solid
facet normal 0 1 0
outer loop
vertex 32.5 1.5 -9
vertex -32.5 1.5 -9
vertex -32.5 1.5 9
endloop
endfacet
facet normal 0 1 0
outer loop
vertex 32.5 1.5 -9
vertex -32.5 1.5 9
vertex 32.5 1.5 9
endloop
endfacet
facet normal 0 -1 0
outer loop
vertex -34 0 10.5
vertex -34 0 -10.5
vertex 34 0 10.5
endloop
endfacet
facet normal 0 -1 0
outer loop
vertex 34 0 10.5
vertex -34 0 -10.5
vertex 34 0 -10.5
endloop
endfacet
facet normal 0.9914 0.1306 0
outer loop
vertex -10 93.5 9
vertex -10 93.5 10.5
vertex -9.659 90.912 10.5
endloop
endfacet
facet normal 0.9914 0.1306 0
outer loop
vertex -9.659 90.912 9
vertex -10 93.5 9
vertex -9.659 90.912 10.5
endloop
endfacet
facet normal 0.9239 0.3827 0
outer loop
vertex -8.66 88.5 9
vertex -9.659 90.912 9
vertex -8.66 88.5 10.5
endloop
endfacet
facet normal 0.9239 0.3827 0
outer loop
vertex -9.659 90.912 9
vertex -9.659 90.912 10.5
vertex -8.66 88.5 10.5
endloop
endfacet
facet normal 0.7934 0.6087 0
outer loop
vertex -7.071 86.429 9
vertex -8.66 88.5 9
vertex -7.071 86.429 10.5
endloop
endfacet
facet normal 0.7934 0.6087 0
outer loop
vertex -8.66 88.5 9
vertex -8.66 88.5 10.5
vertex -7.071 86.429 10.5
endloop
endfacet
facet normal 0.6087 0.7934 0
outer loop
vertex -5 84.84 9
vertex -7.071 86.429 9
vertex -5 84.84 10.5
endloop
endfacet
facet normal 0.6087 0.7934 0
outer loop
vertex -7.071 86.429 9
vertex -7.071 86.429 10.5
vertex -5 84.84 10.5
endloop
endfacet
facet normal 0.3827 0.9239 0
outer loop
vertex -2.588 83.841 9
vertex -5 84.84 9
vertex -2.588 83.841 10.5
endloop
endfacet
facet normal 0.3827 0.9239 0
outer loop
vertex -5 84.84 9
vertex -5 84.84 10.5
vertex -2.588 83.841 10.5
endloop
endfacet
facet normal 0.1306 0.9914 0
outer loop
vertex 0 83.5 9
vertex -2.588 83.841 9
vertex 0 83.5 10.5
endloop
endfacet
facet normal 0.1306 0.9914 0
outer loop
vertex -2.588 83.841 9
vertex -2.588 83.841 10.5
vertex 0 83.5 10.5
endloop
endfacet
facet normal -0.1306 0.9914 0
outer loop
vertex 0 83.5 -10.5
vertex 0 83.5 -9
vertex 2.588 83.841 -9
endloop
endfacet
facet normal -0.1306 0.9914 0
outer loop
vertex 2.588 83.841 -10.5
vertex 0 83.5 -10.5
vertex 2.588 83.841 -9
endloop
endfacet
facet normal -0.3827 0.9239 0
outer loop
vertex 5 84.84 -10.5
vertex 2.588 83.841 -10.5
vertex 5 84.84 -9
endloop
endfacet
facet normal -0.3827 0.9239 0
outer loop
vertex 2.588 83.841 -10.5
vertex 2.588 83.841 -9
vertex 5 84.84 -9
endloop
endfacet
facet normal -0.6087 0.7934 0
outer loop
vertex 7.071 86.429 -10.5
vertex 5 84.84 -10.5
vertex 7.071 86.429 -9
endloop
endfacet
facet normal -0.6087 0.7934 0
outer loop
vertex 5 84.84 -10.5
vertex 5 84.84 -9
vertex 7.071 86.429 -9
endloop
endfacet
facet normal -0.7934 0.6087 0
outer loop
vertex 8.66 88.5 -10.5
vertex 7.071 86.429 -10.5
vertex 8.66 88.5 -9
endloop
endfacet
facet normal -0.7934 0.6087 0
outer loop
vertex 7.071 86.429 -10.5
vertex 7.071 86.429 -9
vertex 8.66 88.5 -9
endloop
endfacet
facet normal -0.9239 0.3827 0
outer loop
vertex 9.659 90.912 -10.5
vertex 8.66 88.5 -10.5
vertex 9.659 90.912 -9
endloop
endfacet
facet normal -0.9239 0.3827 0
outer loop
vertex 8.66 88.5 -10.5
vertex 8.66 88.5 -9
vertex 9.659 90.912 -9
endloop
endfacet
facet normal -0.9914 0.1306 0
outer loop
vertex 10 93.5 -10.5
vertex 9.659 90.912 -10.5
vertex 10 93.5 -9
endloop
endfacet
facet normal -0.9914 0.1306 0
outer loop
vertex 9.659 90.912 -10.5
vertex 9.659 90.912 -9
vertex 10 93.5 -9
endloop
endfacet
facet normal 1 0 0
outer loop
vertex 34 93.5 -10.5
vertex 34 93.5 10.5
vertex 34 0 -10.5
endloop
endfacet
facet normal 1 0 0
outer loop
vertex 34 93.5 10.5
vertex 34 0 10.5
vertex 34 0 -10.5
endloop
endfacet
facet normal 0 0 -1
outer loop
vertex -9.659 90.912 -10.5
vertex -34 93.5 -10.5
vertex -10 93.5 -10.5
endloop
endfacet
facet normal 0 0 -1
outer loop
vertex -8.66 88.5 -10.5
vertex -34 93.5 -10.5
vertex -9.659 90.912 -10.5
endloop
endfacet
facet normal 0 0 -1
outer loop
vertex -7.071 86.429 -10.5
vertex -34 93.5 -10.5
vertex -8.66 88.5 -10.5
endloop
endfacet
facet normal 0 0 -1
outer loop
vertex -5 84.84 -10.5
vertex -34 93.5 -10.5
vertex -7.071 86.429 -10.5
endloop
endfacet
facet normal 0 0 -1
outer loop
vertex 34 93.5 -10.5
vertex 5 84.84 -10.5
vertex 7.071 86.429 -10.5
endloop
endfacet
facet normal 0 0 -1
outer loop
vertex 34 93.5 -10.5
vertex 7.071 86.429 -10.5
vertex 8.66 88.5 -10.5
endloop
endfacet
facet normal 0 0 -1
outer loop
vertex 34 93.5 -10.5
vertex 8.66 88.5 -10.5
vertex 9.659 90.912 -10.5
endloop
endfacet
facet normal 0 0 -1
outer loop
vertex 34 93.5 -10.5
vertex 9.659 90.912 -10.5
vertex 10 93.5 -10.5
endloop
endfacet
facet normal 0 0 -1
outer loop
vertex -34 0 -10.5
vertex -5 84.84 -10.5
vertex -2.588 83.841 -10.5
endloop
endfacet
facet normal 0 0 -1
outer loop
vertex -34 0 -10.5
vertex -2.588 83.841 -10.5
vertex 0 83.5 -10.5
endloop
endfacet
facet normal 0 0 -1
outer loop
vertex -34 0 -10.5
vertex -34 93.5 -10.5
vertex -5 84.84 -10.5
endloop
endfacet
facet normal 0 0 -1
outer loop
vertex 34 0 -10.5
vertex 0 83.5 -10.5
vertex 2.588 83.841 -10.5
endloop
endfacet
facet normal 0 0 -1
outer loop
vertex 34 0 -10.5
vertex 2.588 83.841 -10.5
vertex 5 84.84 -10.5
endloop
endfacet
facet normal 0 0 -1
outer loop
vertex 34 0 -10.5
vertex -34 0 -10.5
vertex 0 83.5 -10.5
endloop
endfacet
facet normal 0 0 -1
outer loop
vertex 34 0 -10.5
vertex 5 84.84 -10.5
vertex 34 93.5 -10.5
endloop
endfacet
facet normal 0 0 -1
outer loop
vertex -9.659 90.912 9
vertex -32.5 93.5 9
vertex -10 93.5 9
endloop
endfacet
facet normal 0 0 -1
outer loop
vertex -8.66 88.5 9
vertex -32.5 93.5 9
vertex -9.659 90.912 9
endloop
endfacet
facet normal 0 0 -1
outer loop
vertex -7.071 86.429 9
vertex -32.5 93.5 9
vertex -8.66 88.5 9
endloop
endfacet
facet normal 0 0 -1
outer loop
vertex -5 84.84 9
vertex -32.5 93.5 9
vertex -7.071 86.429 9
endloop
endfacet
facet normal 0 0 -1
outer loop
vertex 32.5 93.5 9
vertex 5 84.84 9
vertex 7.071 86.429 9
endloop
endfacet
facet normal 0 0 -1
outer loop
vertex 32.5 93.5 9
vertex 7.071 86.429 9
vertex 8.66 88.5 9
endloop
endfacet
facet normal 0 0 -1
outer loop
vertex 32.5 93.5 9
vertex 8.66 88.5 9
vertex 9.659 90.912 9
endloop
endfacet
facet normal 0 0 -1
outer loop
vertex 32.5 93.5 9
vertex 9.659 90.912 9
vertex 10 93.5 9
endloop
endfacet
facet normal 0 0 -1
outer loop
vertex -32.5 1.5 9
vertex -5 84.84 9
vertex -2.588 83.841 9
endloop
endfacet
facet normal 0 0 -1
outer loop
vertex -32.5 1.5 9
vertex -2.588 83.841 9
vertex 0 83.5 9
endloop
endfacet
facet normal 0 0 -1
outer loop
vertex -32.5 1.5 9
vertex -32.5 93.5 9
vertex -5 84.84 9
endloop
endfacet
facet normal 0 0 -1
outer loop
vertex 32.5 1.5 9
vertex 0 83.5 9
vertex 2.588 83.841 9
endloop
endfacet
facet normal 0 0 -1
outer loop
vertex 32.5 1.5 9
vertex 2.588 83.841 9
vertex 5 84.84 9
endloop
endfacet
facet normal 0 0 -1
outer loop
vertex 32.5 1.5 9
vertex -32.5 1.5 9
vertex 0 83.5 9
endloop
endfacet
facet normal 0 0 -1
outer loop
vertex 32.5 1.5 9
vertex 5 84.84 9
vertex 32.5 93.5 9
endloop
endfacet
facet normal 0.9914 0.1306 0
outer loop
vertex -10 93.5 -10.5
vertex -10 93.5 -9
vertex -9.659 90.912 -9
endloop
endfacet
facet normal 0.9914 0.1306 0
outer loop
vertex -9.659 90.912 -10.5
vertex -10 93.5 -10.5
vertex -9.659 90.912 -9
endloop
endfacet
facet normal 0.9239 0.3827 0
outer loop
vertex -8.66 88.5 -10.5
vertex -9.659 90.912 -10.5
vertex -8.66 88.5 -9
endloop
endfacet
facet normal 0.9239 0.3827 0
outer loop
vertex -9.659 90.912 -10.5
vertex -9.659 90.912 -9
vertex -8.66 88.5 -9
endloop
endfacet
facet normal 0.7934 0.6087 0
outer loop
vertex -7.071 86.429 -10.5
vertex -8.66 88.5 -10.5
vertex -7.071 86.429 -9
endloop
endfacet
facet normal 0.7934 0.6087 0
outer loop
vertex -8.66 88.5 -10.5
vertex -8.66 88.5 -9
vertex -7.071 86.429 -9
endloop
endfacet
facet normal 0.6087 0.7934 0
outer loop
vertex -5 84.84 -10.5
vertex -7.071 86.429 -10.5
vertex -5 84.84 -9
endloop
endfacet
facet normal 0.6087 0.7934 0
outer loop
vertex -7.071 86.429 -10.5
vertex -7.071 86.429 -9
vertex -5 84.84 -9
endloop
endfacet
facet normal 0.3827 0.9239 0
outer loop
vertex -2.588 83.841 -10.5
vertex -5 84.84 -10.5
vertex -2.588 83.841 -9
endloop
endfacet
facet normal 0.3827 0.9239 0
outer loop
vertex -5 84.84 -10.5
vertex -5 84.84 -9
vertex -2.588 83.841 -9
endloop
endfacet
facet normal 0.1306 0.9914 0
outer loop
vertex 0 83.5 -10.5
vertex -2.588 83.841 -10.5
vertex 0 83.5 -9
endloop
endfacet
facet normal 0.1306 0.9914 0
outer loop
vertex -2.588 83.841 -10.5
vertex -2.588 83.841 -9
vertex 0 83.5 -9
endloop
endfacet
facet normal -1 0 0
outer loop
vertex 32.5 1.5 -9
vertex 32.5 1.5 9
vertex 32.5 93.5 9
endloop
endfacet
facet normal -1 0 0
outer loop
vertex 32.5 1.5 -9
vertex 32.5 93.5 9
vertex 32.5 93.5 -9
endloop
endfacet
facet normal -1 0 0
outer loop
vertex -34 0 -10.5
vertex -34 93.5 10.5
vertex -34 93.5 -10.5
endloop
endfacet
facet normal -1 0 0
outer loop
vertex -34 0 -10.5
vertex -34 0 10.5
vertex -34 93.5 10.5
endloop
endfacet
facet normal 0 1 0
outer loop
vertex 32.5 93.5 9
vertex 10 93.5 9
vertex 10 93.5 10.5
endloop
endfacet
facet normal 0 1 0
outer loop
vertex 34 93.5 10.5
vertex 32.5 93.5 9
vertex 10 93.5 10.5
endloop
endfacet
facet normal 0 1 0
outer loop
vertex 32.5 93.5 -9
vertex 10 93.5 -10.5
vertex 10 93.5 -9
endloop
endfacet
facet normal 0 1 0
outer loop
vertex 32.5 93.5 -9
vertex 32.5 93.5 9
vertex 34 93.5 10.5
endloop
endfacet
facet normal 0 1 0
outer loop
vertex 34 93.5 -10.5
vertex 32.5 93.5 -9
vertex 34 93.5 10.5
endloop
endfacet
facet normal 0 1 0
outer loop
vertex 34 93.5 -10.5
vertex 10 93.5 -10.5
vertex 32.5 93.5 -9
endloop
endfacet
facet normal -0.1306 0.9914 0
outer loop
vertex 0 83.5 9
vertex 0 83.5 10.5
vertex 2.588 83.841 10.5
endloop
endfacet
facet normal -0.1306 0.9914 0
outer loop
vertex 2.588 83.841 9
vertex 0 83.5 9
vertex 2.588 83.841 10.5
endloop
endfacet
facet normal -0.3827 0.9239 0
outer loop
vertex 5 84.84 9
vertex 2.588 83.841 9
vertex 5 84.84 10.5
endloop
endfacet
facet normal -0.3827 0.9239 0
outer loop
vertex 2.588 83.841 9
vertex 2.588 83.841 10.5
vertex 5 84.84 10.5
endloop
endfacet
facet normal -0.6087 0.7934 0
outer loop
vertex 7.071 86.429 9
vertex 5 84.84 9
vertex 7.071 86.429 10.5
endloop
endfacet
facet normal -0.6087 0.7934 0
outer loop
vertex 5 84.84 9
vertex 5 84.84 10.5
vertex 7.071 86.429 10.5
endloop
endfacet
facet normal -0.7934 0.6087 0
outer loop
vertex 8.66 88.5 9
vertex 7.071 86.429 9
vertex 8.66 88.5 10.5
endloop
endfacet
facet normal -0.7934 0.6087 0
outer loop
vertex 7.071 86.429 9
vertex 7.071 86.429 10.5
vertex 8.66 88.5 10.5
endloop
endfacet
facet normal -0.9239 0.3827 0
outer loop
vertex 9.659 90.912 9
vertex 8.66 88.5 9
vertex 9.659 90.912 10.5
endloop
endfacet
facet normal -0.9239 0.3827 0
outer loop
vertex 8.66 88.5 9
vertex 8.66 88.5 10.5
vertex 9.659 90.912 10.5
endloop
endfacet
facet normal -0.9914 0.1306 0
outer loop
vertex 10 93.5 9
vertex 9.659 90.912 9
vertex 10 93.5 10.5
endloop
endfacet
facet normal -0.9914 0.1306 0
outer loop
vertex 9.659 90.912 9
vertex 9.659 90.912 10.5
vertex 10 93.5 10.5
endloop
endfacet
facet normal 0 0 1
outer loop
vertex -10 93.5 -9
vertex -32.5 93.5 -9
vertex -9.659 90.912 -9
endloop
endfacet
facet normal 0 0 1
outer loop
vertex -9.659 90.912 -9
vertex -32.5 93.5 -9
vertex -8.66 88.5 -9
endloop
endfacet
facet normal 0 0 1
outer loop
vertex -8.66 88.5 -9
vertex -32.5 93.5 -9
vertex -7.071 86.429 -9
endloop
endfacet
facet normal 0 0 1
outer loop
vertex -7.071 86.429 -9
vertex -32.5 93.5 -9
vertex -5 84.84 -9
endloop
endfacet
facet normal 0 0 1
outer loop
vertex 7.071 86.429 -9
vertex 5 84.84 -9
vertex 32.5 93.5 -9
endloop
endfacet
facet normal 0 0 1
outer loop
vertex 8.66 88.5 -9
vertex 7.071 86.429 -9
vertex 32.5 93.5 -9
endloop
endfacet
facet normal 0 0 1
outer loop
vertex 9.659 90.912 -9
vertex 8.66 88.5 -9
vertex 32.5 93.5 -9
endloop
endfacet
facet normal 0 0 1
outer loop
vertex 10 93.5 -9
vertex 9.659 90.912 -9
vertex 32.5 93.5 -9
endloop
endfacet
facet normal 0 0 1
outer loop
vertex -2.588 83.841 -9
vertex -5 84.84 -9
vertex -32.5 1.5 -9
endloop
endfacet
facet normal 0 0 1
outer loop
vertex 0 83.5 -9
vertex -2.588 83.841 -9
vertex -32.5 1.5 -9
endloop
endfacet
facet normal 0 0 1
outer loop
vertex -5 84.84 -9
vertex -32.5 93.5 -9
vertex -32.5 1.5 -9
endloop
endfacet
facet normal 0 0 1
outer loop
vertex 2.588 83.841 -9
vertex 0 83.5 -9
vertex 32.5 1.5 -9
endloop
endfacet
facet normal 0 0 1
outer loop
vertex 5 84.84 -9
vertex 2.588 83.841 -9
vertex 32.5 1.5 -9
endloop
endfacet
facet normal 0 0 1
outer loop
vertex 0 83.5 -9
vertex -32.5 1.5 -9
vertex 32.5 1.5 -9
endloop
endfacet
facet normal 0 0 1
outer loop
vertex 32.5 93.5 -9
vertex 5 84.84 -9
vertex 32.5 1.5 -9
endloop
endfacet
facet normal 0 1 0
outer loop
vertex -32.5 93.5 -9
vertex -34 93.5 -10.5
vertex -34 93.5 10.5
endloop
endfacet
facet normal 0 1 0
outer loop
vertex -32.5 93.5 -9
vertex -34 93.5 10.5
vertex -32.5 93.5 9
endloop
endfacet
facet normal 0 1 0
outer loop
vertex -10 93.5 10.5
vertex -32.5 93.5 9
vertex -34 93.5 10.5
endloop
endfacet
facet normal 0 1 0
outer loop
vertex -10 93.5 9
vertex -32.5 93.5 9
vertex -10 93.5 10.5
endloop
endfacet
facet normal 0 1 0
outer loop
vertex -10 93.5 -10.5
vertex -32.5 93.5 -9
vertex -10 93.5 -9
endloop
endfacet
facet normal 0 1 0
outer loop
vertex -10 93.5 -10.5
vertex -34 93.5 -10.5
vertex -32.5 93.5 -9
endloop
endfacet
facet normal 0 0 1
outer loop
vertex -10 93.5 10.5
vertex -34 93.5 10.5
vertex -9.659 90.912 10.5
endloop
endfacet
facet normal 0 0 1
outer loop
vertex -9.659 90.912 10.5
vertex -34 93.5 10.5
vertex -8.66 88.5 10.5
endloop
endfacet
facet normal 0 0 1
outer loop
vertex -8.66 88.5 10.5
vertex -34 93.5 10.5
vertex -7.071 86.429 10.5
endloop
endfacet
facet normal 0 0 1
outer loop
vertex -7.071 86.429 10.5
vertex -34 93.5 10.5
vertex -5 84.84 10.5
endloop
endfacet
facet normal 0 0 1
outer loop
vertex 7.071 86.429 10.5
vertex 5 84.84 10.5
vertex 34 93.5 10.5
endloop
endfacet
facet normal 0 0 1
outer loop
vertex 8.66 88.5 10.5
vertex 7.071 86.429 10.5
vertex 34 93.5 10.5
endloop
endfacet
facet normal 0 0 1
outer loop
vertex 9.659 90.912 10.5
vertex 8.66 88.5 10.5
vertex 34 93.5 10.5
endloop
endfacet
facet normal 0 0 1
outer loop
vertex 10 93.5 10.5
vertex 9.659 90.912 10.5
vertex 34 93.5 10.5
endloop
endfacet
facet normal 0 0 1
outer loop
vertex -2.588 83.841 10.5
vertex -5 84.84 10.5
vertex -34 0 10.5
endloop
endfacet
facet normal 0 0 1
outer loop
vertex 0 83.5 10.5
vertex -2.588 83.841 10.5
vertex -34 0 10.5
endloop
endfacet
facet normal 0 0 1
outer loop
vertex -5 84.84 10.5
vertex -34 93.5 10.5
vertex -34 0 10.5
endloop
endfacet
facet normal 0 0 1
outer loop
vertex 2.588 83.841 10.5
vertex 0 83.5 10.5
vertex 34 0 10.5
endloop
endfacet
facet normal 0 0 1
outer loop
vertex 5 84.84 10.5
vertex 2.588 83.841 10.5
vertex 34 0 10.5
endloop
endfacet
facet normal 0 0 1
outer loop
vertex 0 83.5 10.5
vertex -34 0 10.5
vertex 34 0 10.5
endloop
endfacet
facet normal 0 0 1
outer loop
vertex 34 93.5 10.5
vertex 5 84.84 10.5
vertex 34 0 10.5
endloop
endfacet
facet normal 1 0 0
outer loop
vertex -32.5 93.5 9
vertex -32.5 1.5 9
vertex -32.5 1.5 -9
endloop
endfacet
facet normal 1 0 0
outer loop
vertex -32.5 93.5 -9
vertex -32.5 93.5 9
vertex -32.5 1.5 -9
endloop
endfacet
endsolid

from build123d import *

# Parameters (mm, degrees)
SKETCH1_W           = 68
SKETCH1_H           = 21
SKETCH1_W_2         = 65
SKETCH1_H_2         = 18
BOSS_EXTRUDE1_DEPTH = 1.5
SKETCH2_W           = 68
SKETCH2_H           = 21
SKETCH2_W_2         = 65
SKETCH2_H_2         = 18
BOSS_EXTRUDE2_DEPTH = 92
CUT_EXTRUDE1_REACH  = 103.682


with BuildPart() as part:
    # Sketch1 → Boss-Extrude1 (new body)
    # profile 1 of 2: a face of its own
    with BuildSketch(Plane(origin=(0, 0, 0), x_dir=(1, 0, 0), z_dir=(0, 1, 0))):
        Rectangle(SKETCH1_W, SKETCH1_H)
        Rectangle(SKETCH1_W_2, SKETCH1_H_2, mode=Mode.SUBTRACT)
    # profile 2 of 2: a face of its own
    with BuildSketch(Plane(origin=(0, 0, 0), x_dir=(1, 0, 0), z_dir=(0, 1, 0))):
        Rectangle(SKETCH1_W_2, SKETCH1_H_2)
    extrude(amount=BOSS_EXTRUDE1_DEPTH)

    # Sketch2 → Boss-Extrude2 (add)
    with BuildSketch(Plane(origin=(0, 1.5, 0), x_dir=(1, 0, 0), z_dir=(0, 1, 0))):
        Rectangle(SKETCH2_W, SKETCH2_H)
        Rectangle(SKETCH2_W_2, SKETCH2_H_2, mode=Mode.SUBTRACT)
    extrude(amount=BOSS_EXTRUDE2_DEPTH)

    # Cut-Extrude1: up to this face of the body (flat: up to its plane)
    cut_extrude1_end = Plane(part.part.faces().sort_by_distance((0, 46.75, -10.5))[0])
    # Sketch3 → Cut-Extrude1 (cut, up to the picked face)
    with BuildSketch(Plane.XY.offset(10.5), mode=Mode.PRIVATE) as cut_extrude1_sk1:
        with BuildLine():
            Line((10, 93.5), (0, 93.5))
            Line((0, 93.5), (0, 83.5))
            ThreePointArc((0, 83.5), (7.071067812, 86.428932188), (10, 93.5))
        make_face()
    cut_extrude1_tool1 = split(extrude(cut_extrude1_sk1.sketch, amount=-CUT_EXTRUDE1_REACH, mode=Mode.PRIVATE), bisect_by=cut_extrude1_end, keep=Keep.BOTH, mode=Mode.PRIVATE)
    # Sketch3 → Cut-Extrude1 (cut, up to the picked face)
    with BuildSketch(Plane.XY.offset(10.5), mode=Mode.PRIVATE) as cut_extrude1_sk2:
        with BuildLine():
            Line((0, 83.5), (0, 93.5))
            Line((0, 93.5), (-10, 93.5))
            ThreePointArc((-10, 93.5), (-7.071067812, 86.428932188), (0, 83.5))
        make_face()
    cut_extrude1_tool2 = split(extrude(cut_extrude1_sk2.sketch, amount=-CUT_EXTRUDE1_REACH, mode=Mode.PRIVATE), bisect_by=cut_extrude1_end, keep=Keep.BOTH, mode=Mode.PRIVATE)
    # Sketch3 → Cut-Extrude1 (cut, up to the picked face)
    with BuildSketch(Plane.XY.offset(10.5), mode=Mode.PRIVATE) as cut_extrude1_sk3:
        with BuildLine():
            Line((10, 93.5), (0, 93.5))
            Line((0, 93.5), (0, 83.5))
            ThreePointArc((0, 83.5), (7.071067812, 86.428932188), (10, 93.5))
        make_face()
    cut_extrude1_tool3 = split(extrude(cut_extrude1_sk3.sketch, amount=-CUT_EXTRUDE1_REACH, mode=Mode.PRIVATE), bisect_by=cut_extrude1_end, keep=Keep.BOTH, mode=Mode.PRIVATE)
    # Sketch3 → Cut-Extrude1 (cut, up to the picked face)
    with BuildSketch(Plane.XY.offset(10.5), mode=Mode.PRIVATE) as cut_extrude1_sk4:
        with BuildLine():
            Line((0, 83.5), (0, 93.5))
            Line((0, 93.5), (-10, 93.5))
            ThreePointArc((-10, 93.5), (-7.071067812, 86.428932188), (0, 83.5))
        make_face()
    cut_extrude1_tool4 = split(extrude(cut_extrude1_sk4.sketch, amount=-CUT_EXTRUDE1_REACH, mode=Mode.PRIVATE), bisect_by=cut_extrude1_end, keep=Keep.BOTH, mode=Mode.PRIVATE)
    add(cut_extrude1_tool1.solids().sort_by(Axis((4.244132, 89.255868, 10.5), (0, 0, -1)))[0], mode=Mode.SUBTRACT)
    add(cut_extrude1_tool2.solids().sort_by(Axis((-4.244132, 89.255868, 10.5), (0, 0, -1)))[0], mode=Mode.SUBTRACT)
    add(cut_extrude1_tool3.solids().sort_by(Axis((4.244132, 89.255868, 10.5), (0, 0, -1)))[0], mode=Mode.SUBTRACT)
    add(cut_extrude1_tool4.solids().sort_by(Axis((-4.244132, 89.255868, 10.5), (0, 0, -1)))[0], mode=Mode.SUBTRACT)


solid = part.part
